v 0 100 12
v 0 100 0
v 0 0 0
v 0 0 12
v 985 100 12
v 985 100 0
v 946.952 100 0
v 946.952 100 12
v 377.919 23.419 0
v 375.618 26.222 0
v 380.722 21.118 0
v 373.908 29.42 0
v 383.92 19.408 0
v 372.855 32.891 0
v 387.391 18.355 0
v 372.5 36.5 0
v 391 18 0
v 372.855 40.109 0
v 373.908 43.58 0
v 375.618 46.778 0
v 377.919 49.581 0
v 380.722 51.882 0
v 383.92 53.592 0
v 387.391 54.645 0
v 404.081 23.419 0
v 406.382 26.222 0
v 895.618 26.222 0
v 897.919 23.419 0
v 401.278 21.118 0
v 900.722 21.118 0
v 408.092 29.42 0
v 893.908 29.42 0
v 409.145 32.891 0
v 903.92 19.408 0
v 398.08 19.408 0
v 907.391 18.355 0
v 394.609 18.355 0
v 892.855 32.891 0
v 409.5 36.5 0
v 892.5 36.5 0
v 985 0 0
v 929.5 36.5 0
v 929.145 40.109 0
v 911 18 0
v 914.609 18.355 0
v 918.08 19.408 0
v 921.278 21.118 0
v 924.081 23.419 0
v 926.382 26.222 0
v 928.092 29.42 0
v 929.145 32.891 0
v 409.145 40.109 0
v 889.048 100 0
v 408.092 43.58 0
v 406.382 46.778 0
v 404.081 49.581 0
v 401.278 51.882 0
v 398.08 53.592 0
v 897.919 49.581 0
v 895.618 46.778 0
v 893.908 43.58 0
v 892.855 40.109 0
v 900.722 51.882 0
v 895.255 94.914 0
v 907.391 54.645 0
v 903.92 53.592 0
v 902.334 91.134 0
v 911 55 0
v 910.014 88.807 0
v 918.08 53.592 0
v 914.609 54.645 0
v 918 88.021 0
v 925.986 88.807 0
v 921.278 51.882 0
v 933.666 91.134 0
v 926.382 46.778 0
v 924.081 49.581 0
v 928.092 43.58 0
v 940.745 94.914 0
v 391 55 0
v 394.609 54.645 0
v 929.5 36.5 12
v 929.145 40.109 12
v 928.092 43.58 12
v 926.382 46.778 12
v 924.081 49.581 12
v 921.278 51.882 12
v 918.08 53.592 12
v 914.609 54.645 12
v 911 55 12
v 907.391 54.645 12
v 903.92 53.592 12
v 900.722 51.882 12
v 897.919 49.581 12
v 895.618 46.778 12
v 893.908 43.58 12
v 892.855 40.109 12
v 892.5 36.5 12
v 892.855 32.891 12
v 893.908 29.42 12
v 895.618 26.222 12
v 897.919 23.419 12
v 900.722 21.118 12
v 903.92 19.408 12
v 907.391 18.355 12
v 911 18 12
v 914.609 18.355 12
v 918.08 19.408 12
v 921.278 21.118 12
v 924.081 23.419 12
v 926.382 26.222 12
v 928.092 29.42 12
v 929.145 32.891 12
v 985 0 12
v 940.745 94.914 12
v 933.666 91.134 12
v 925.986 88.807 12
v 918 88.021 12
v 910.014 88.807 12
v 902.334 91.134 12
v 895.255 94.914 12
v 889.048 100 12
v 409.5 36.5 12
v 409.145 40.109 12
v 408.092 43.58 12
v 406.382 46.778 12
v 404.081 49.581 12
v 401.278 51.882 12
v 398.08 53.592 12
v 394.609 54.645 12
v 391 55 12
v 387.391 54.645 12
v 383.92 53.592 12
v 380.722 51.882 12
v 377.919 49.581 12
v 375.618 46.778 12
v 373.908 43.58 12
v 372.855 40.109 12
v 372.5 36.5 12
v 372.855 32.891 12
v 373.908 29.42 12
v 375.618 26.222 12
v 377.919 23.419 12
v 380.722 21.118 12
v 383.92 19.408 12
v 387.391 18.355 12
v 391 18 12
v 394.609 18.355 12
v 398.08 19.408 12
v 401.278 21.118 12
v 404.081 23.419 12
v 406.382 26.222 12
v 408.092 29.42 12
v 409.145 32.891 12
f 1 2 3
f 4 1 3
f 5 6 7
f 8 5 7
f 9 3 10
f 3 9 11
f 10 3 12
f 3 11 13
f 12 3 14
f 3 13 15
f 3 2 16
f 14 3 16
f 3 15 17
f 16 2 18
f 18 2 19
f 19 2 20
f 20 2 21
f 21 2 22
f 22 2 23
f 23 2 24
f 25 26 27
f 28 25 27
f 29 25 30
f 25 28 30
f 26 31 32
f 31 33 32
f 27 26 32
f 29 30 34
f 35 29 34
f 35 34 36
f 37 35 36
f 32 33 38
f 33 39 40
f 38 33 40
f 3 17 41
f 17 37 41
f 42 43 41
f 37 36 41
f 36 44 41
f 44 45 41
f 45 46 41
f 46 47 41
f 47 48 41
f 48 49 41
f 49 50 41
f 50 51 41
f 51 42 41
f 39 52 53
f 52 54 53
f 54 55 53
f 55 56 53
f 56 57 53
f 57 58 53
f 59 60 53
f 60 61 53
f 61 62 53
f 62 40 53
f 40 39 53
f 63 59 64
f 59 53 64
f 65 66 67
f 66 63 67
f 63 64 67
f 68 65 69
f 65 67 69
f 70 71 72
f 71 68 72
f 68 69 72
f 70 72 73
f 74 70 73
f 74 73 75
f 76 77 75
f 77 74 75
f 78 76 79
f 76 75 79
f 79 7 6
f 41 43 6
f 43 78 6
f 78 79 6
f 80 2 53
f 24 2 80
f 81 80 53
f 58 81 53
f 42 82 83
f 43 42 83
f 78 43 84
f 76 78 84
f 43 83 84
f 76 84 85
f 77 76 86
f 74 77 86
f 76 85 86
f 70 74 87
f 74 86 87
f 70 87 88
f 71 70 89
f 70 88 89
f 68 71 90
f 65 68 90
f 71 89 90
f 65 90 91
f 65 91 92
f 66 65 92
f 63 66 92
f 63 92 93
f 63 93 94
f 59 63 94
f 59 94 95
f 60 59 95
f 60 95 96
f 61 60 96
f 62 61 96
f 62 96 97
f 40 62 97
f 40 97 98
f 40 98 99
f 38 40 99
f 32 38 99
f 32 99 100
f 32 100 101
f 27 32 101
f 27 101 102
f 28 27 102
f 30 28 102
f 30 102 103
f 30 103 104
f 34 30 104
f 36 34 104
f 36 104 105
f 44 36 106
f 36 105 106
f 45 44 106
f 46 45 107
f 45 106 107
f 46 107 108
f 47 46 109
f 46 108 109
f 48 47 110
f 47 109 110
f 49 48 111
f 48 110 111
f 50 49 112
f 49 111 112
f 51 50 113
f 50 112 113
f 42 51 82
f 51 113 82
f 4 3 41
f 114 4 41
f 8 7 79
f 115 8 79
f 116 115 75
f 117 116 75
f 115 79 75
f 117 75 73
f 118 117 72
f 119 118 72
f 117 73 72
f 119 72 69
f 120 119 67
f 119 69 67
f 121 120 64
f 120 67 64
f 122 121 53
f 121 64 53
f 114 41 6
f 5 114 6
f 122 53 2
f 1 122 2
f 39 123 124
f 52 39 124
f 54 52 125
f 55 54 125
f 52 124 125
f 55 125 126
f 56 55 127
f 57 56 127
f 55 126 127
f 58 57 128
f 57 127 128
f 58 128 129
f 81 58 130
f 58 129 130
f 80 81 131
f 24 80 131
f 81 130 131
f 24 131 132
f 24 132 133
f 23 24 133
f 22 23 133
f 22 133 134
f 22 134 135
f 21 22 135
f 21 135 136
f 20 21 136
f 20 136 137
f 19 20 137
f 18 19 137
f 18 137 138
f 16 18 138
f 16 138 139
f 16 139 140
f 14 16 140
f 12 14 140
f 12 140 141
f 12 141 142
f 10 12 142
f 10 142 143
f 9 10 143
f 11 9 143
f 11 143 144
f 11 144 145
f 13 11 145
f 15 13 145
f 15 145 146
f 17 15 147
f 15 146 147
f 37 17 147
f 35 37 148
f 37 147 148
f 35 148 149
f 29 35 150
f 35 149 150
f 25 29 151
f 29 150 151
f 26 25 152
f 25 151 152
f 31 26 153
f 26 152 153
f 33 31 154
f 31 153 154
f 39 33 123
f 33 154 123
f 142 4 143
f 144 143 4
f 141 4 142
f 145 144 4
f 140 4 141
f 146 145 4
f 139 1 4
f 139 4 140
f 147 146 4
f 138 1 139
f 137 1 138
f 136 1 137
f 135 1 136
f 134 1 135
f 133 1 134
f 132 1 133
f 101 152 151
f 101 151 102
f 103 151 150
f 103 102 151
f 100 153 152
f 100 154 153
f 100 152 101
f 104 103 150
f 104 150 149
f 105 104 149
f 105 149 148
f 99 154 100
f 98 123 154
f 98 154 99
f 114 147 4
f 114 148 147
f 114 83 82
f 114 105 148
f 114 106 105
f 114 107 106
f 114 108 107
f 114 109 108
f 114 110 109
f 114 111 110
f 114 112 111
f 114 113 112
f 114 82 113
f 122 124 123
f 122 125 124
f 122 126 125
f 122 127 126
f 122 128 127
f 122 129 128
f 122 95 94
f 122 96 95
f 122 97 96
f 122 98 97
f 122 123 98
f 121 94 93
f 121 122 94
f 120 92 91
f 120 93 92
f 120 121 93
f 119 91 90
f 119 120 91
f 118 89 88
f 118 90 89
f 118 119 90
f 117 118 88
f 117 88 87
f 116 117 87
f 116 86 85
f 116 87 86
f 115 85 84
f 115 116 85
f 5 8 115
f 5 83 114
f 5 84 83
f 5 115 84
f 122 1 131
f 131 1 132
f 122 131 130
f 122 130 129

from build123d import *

# Parameters (mm, degrees)
SALIENTE_EXTRUIR1_DEPTH = 12
CROQUIS2_R              = 18.5
CORTAR_EXTRUIR1_DEPTH   = 13
CROQUIS3_R              = 18.5
CORTAR_EXTRUIR2_DEPTH   = 13


with BuildPart() as part:
    # Croquis1 → Saliente-Extruir1 (new body)
    with BuildSketch(Plane.XY):
        with BuildLine():
            Line((0, 0), (985, 0))
            Line((985, 0), (985, 100))
            Line((985, 100), (946.952353927, 100))
            ThreePointArc((946.952353927, 100), (918, 88.021483703), (889.047646073, 100))
            Line((889.047646073, 100), (0, 100))
            Line((0, 100), (0, 0))
        make_face()
    extrude(amount=SALIENTE_EXTRUIR1_DEPTH)

    # Croquis2 → Cortar-Extruir1 (cut, through all)
    with BuildSketch(Plane.XY.offset(12)):
        with Locations((911, 36.5)):
            Circle(CROQUIS2_R)
    extrude(amount=-CORTAR_EXTRUIR1_DEPTH, mode=Mode.SUBTRACT)

    # Croquis3 → Cortar-Extruir2 (cut, through all)
    with BuildSketch(Plane.XY.offset(12)):
        with Locations((391, 36.5)):
            Circle(CROQUIS3_R)
    extrude(amount=-CORTAR_EXTRUIR2_DEPTH, mode=Mode.SUBTRACT)


solid = part.part
